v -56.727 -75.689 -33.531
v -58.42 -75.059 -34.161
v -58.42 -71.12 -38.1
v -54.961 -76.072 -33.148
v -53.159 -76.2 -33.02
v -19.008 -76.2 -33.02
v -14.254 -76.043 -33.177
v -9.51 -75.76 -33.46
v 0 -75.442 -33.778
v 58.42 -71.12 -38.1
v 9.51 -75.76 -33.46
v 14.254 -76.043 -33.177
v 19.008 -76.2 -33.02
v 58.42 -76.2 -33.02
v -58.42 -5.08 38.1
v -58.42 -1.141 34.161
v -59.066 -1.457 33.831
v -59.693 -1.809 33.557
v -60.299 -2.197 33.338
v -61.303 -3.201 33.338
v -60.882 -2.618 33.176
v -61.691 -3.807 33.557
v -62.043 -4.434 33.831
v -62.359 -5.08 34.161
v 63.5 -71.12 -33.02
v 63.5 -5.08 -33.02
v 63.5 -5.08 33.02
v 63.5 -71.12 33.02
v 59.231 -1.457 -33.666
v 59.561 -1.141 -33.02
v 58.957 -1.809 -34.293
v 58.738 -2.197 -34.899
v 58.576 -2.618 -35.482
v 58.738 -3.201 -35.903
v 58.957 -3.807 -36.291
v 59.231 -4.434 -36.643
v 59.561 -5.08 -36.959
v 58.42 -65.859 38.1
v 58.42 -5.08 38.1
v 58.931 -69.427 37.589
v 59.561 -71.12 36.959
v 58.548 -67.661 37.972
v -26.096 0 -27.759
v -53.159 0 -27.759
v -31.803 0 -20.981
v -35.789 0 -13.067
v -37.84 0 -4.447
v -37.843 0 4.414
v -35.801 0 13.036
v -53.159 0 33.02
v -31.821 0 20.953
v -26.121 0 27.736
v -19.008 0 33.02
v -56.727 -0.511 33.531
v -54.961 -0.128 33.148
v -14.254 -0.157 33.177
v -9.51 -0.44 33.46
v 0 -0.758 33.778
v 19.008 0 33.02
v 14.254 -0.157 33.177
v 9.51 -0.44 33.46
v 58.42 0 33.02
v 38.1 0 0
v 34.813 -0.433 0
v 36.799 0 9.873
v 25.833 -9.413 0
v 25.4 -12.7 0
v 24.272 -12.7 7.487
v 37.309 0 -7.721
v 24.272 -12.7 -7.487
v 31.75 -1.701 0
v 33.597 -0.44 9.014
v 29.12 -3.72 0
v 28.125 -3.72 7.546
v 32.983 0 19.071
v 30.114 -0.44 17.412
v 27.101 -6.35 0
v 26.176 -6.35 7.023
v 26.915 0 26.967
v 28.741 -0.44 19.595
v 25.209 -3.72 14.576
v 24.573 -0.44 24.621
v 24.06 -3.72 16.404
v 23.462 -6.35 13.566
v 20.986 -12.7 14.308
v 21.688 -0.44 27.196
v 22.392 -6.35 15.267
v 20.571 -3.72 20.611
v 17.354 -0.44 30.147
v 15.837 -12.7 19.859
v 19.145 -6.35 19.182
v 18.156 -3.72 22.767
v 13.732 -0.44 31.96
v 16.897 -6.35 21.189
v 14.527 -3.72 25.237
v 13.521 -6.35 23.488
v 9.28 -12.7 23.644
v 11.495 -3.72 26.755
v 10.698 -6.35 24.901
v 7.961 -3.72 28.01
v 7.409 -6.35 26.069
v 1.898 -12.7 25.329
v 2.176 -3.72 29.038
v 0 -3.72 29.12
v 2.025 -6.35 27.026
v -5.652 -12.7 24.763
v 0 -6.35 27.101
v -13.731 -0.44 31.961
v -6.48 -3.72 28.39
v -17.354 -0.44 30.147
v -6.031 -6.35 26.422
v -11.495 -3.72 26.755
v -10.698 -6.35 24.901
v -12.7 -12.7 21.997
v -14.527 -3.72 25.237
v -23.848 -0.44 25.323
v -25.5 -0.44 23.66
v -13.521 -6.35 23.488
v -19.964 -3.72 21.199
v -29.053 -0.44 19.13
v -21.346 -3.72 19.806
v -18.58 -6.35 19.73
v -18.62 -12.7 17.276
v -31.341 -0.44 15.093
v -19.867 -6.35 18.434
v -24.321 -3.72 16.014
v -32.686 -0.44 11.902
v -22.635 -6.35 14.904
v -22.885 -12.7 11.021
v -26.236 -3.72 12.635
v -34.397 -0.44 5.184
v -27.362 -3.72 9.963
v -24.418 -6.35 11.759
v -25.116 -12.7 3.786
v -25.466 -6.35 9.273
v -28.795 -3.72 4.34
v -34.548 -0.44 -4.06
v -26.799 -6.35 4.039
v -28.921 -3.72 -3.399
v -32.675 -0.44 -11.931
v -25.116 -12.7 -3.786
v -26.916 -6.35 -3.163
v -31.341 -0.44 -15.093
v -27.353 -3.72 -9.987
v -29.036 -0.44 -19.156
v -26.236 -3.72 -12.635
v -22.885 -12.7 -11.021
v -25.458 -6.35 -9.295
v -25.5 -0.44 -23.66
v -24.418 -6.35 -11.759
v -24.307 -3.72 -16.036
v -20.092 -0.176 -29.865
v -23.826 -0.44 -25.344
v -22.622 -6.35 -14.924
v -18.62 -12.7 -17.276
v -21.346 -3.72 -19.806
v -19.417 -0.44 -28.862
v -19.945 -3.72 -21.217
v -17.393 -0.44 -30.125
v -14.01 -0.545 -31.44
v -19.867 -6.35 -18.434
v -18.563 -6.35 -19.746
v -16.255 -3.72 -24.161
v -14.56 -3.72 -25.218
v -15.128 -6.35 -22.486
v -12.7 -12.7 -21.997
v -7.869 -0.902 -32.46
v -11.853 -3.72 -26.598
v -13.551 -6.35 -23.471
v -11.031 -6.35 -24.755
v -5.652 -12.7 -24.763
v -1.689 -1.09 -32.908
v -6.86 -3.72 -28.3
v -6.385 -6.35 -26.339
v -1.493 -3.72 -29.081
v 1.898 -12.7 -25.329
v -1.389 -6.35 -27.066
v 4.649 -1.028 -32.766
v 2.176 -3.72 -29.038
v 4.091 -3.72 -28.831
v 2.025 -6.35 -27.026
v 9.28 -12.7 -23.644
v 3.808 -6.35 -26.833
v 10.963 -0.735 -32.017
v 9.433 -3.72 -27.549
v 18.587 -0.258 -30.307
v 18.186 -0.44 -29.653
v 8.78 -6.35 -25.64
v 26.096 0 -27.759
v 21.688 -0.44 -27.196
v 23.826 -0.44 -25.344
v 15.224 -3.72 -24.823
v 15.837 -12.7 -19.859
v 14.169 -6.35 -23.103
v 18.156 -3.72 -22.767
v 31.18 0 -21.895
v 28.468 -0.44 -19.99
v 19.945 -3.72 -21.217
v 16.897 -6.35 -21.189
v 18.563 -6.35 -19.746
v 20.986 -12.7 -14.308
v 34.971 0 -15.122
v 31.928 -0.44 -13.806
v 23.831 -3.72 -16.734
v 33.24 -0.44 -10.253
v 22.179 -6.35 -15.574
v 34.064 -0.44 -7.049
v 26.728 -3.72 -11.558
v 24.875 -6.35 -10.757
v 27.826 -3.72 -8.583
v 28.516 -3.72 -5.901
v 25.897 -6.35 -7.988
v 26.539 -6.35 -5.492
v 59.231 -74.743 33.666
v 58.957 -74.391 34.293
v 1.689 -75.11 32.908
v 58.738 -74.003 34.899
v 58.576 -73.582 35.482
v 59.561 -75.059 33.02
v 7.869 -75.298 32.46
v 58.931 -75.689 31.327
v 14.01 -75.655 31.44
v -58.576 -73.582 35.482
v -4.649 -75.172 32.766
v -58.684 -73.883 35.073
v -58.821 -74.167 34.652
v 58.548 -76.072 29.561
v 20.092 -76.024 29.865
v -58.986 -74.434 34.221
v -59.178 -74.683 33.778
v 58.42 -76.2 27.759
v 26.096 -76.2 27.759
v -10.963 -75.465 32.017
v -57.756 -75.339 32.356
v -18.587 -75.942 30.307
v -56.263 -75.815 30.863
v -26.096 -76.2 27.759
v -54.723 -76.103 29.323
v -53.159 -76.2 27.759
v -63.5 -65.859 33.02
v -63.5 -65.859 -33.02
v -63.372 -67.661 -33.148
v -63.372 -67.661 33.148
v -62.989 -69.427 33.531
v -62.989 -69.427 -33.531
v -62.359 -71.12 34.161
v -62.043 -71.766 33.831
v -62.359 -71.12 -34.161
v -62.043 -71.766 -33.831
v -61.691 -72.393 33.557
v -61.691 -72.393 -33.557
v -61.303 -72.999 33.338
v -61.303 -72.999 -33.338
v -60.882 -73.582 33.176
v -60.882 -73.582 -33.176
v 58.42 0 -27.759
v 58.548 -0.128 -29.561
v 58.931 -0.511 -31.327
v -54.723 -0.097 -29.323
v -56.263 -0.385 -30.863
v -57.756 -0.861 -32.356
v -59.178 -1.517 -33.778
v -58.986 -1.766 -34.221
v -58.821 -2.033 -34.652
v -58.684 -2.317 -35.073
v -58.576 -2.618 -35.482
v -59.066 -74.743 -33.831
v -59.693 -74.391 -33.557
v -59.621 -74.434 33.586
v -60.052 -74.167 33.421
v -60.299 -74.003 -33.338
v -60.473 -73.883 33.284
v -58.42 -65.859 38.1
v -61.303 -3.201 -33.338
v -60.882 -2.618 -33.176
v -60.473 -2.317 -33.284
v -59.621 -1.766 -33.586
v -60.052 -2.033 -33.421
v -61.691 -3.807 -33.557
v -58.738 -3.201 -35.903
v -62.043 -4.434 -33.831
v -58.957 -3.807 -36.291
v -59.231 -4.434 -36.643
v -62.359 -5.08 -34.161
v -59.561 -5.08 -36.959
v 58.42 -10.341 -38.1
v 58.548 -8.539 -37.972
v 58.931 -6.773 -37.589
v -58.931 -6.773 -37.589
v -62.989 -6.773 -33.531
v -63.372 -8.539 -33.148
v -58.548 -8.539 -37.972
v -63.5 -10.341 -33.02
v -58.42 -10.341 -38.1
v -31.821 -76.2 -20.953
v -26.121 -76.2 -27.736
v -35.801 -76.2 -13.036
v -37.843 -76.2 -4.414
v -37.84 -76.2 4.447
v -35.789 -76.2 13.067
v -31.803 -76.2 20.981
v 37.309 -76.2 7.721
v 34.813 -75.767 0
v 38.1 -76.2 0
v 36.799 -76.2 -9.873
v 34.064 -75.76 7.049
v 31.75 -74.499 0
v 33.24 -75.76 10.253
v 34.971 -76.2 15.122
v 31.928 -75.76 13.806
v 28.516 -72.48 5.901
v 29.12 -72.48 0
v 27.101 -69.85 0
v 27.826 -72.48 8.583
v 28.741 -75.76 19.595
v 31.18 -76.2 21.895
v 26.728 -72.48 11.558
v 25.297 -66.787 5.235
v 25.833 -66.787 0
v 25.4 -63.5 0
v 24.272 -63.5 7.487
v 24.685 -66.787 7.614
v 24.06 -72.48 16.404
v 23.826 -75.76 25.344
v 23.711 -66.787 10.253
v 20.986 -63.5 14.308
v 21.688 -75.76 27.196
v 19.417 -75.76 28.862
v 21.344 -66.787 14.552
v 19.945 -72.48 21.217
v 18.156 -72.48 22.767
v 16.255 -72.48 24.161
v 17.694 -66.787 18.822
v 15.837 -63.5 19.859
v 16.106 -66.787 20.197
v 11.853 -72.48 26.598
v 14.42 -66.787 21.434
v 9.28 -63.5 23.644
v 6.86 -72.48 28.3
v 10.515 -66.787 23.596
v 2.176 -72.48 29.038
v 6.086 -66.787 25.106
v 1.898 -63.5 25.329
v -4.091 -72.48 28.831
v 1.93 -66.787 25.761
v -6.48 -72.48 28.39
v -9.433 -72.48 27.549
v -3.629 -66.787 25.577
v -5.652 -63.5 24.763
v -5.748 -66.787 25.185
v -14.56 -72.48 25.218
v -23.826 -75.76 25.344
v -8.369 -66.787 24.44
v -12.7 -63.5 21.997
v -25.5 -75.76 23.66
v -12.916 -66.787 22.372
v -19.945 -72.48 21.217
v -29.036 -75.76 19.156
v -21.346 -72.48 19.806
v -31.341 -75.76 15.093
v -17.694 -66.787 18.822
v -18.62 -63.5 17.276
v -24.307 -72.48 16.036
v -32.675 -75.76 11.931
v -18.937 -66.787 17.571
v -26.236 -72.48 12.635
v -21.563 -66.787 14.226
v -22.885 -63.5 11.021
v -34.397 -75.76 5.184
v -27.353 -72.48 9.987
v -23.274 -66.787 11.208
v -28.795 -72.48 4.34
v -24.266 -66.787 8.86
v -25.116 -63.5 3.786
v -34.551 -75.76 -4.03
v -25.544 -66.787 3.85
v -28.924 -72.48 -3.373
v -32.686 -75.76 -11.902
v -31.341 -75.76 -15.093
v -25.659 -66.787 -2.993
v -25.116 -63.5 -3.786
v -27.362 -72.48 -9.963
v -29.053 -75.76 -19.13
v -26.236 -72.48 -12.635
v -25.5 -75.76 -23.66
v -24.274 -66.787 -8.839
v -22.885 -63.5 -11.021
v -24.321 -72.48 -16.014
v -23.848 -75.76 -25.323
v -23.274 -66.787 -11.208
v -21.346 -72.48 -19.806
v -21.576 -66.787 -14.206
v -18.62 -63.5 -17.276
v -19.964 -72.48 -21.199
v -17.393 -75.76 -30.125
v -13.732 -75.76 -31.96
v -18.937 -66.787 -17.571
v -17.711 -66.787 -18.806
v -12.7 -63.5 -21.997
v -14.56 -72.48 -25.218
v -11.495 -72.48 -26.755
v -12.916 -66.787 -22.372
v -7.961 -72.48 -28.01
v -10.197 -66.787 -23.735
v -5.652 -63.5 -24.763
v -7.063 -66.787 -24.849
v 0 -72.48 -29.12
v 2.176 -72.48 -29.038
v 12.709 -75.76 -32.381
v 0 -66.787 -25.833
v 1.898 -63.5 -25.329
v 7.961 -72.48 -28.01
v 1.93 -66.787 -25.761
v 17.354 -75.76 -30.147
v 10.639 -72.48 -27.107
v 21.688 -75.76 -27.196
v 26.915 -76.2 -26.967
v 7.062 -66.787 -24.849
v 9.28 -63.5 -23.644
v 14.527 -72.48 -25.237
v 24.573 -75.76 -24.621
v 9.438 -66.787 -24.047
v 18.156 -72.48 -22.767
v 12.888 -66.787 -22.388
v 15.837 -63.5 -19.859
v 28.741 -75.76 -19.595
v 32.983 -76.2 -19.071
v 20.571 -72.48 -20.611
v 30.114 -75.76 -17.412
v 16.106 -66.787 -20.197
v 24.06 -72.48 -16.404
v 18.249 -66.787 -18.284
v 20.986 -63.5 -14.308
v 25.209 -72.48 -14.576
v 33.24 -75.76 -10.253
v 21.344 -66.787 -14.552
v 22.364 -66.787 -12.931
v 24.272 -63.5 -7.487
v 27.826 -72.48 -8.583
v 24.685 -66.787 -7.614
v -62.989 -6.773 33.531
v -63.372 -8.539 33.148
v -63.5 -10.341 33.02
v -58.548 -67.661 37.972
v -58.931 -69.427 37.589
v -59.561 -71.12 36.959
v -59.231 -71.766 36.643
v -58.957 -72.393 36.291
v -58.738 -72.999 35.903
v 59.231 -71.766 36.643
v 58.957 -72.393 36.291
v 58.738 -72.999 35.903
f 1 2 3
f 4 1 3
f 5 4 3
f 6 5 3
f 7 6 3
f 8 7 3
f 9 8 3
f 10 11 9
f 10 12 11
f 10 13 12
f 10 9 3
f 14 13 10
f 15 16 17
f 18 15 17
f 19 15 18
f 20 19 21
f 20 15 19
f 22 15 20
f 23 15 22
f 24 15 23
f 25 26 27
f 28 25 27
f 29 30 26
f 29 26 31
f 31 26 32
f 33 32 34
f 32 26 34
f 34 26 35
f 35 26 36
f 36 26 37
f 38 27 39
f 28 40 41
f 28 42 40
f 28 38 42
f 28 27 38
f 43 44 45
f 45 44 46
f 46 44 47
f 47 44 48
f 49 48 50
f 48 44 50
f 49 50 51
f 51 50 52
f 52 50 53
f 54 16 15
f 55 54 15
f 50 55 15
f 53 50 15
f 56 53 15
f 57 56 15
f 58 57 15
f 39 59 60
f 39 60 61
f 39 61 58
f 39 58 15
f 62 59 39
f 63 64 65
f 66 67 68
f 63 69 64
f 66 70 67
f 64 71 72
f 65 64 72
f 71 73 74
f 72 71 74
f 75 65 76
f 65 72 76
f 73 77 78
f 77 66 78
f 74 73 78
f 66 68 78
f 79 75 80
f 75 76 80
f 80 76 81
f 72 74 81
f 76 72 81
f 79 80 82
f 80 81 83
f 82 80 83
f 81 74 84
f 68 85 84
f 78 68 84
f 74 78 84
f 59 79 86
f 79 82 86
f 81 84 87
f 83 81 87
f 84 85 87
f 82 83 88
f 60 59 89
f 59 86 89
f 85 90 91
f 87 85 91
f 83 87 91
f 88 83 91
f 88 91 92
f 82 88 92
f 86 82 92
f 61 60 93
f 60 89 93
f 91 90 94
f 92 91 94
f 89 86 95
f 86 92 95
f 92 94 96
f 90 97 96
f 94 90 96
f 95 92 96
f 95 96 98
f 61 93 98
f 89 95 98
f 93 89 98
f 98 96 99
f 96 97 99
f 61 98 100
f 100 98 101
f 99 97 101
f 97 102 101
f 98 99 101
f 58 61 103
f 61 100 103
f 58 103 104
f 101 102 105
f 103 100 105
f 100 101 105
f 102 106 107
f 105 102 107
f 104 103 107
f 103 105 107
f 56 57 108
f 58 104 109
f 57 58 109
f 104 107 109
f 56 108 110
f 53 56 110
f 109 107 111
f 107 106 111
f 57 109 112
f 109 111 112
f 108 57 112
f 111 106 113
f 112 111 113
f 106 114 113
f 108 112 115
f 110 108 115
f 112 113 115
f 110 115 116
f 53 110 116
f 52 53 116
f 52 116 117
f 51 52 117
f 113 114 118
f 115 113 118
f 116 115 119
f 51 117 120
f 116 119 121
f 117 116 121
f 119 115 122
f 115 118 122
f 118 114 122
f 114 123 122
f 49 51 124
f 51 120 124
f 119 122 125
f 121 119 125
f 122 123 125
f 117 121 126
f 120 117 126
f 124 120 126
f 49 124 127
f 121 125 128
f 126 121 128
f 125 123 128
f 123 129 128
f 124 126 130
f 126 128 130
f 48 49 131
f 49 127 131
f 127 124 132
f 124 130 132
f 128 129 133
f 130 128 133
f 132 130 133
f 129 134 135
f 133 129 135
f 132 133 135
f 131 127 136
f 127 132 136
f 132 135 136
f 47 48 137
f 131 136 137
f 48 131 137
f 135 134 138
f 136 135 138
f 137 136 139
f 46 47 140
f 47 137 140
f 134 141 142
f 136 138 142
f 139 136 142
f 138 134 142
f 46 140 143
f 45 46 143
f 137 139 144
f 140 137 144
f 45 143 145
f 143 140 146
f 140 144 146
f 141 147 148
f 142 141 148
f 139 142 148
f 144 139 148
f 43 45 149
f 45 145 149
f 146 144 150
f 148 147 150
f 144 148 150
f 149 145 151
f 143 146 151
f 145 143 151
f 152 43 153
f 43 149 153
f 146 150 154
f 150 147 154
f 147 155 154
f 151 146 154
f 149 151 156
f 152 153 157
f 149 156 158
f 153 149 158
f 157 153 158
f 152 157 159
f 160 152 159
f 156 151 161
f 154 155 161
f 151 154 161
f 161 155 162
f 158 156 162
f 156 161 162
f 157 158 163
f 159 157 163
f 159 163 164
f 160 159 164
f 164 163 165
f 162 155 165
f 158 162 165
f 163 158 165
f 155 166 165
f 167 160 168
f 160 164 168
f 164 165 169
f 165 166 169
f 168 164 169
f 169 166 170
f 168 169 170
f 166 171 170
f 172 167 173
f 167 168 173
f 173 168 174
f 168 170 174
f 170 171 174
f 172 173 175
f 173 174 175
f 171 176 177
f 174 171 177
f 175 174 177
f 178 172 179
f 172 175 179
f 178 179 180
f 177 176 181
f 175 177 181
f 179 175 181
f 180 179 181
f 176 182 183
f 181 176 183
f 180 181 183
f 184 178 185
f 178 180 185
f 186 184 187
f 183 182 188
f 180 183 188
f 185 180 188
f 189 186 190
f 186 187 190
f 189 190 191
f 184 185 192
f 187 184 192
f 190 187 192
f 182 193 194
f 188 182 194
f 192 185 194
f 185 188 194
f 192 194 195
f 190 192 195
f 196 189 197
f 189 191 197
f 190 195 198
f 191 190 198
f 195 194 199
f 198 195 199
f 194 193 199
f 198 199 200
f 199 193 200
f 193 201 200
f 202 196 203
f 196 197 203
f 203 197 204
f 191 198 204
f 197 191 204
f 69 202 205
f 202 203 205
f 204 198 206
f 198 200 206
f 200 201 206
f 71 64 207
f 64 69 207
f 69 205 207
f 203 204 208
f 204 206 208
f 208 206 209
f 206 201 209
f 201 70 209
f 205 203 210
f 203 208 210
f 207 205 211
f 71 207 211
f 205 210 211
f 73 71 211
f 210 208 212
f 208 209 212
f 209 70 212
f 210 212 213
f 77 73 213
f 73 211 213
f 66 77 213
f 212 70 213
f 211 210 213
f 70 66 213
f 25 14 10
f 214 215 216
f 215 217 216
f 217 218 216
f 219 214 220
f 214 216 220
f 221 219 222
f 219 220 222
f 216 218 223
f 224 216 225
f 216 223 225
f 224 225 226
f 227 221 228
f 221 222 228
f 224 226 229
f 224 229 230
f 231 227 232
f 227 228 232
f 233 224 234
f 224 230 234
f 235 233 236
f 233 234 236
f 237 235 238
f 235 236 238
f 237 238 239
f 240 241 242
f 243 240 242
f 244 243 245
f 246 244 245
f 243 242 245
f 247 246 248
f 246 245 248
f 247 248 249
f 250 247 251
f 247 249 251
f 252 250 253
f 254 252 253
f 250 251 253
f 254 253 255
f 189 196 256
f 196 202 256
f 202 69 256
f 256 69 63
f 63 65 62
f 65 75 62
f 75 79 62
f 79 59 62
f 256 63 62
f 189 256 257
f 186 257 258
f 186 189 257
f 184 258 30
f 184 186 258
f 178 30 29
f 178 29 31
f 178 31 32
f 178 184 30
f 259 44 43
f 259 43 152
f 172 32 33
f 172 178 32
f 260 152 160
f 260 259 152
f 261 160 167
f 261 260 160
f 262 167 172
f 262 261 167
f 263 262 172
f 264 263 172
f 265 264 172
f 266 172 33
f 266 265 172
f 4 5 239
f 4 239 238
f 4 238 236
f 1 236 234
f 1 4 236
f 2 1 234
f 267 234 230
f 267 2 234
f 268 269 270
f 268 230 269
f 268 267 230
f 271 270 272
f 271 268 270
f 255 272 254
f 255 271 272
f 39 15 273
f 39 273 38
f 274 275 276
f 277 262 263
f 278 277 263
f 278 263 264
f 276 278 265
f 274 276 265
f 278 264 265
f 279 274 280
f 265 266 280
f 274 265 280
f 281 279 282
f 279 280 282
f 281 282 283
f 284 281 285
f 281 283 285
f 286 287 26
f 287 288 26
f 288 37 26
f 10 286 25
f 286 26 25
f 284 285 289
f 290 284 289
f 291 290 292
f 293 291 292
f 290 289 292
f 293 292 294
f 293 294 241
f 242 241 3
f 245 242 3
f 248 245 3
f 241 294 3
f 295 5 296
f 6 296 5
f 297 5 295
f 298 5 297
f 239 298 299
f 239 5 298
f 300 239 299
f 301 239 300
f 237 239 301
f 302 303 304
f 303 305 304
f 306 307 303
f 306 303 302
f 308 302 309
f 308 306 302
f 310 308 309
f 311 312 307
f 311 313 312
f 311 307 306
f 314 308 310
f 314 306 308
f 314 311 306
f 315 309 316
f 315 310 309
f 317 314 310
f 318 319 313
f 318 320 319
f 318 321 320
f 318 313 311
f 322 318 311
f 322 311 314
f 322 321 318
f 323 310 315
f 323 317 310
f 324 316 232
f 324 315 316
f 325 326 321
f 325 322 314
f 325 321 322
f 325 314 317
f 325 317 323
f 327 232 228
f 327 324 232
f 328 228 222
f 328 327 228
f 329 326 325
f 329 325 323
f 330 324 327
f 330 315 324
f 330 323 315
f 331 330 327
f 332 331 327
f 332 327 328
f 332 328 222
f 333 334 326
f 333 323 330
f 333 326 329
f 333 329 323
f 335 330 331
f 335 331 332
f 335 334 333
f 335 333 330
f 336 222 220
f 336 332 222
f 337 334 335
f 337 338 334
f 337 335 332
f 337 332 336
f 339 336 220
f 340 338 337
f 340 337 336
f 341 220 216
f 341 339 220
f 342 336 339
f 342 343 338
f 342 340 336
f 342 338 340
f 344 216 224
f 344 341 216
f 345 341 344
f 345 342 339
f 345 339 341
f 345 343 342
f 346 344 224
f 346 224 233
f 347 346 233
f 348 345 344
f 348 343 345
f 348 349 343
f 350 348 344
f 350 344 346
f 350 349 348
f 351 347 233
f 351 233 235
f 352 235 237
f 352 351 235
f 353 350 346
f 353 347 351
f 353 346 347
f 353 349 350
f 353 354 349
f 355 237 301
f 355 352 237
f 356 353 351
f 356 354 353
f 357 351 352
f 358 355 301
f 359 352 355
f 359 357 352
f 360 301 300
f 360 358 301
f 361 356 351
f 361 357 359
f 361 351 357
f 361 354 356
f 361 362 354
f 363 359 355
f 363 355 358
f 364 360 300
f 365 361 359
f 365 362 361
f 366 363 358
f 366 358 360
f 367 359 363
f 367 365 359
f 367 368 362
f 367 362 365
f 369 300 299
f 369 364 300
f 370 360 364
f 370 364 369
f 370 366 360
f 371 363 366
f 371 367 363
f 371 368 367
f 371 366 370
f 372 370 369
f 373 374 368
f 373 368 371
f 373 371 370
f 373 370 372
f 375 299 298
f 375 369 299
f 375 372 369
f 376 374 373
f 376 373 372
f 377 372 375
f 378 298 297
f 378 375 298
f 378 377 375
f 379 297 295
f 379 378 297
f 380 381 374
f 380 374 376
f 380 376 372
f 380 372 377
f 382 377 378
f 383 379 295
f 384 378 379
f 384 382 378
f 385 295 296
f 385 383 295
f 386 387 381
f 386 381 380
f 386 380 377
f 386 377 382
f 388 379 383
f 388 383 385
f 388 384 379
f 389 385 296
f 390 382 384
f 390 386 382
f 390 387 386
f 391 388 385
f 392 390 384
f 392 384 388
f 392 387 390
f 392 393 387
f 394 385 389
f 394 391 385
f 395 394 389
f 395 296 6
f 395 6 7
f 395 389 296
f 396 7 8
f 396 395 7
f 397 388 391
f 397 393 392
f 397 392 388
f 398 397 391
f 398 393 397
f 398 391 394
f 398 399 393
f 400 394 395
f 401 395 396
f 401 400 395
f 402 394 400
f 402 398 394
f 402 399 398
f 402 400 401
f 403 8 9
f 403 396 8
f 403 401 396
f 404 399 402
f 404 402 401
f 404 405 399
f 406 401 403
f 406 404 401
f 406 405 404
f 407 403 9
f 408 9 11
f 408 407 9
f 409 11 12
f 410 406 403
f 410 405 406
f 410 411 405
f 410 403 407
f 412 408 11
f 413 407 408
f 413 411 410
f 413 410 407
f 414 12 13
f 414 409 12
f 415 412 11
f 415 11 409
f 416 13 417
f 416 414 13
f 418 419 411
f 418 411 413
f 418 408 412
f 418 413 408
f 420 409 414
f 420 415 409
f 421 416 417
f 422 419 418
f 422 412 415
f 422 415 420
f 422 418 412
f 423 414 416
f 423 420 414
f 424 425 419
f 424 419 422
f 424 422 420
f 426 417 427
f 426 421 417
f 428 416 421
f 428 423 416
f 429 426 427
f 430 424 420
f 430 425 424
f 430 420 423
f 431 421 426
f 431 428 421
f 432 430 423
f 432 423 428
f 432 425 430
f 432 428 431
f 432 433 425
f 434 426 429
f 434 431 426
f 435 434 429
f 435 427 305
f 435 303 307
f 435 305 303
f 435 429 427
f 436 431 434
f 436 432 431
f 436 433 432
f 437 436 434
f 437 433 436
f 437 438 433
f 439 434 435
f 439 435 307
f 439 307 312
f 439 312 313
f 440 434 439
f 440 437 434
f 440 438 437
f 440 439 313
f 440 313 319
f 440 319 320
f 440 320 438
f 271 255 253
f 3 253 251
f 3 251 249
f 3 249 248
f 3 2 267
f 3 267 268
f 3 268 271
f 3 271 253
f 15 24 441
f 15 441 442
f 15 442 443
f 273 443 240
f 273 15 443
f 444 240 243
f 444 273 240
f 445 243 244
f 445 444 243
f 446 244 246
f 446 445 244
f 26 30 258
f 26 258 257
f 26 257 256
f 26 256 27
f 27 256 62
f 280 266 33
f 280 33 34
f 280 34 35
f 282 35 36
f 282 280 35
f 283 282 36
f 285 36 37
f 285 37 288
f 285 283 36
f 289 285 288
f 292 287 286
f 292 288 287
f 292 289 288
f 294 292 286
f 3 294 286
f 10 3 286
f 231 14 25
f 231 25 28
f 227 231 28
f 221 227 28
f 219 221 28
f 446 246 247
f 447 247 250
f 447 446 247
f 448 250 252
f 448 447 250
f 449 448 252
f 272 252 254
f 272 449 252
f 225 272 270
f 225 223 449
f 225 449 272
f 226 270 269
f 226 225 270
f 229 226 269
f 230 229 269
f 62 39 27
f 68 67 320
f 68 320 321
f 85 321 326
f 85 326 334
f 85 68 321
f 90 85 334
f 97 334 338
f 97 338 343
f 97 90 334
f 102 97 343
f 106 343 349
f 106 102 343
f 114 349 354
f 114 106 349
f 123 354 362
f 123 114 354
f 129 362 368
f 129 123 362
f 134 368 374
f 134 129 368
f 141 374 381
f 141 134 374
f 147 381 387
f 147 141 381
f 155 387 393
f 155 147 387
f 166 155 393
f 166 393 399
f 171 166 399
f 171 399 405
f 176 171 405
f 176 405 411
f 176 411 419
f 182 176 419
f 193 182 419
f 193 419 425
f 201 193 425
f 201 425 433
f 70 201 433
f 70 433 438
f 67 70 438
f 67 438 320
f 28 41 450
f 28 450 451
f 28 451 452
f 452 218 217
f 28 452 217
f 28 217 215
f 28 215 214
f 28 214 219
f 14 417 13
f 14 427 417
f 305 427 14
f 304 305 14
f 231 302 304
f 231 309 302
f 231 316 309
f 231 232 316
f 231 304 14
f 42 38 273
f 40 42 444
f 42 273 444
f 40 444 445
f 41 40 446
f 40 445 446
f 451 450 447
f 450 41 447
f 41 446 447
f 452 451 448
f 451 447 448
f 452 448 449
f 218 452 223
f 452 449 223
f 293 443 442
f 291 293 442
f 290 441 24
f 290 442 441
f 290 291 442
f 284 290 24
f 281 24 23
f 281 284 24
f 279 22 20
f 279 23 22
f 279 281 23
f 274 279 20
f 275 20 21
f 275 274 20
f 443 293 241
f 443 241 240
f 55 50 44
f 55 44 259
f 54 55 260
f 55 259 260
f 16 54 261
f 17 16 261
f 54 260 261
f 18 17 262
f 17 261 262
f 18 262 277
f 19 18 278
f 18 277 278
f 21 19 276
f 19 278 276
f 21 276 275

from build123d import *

# Parameters (mm, degrees)
F0_W        = 127
F0_H        = 76.2
F0_R        = 25.4
F1_DEPTH    = 76.2
F2_SIZE     = 5.08
F3_T1_DEPTH = 143.1425612107
F3_T3_DEPTH = 92.3425612107


# Not quite as in the source:
# - a fillet or chamfer that OpenCascade refuses, or shapes differently, is made with other operations: its cross-section is extruded or revolved along the edge and cut away or added


with BuildPart() as f1:
    # F0 (on Front) → F1 (new body)
    with BuildSketch(Plane.XZ):
        Rectangle(F0_W, F0_H)
        Circle(F0_R, mode=Mode.SUBTRACT)
    extrude(amount=F1_DEPTH)

    # F2
    f2_edges = [f1.edges().sort_by_distance(p)[0] for p in [
        (0, -76.2, 38.1),
        (-63.5, -38.1, 38.1),
        (0, 0, 38.1),
        (63.5, -38.1, 38.1),
        (63.5, -76.2, 0),
        (0, -76.2, -38.1),
        (-63.5, -76.2, 0),
        (63.5, -38.1, -38.1),
        (63.5, 0, 0),
        (0, 0, -38.1),
        (-63.5, 0, 0),
        (-63.5, -38.1, -38.1),
    ]]
    chamfer(f2_edges, length=F2_SIZE)

    # F3: fillet of radius 12.7 on 10 edges, made by hand

    # F3_s2 → F3_t1 (cut)
    with BuildSketch(Plane.YZ.offset(-71.5712806053)):
        with BuildLine():
            ThreePointArc((0, -27.7594877579), (-0.9667299371, -32.6195673489), (-3.7197438789, -36.7397438789))
            Line((-3.7197438789, -36.7397438789), (0, -33.02))
            Line((0, -33.02), (0, -27.7594877579))
        make_face()
        with BuildLine():
            ThreePointArc((-1.3602561211, -34.3802561211), (-5.4804326511, -37.1332700629), (-10.3405122421, -38.1))
            Line((-10.3405122421, -38.1), (-5.08, -38.1))
            Line((-5.08, -38.1), (-1.3602561211, -34.3802561211))
        make_face()
        with BuildLine():
            ThreePointArc((-65.8594877579, 38.1), (-70.7195673489, 37.1332700629), (-74.8397438789, 34.3802561211))
            Line((-74.8397438789, 34.3802561211), (-71.12, 38.1))
            Line((-71.12, 38.1), (-65.8594877579, 38.1))
        make_face()
        with BuildLine():
            ThreePointArc((-72.4802561211, 36.7397438789), (-75.2332700629, 32.6195673489), (-76.2, 27.7594877579))
            Line((-76.2, 27.7594877579), (-76.2, 33.02))
            Line((-76.2, 33.02), (-72.4802561211, 36.7397438789))
        make_face()
    extrude(amount=F3_T1_DEPTH, mode=Mode.SUBTRACT)

    # F3_s4 → F3_t3 (cut)
    with BuildSketch(Plane.XY.offset(-46.1712806053)):
        with BuildLine():
            ThreePointArc((-63.5, -65.8594877579), (-62.5332700629, -70.7195673489), (-59.7802561211, -74.8397438789))
            Line((-59.7802561211, -74.8397438789), (-63.5, -71.12))
            Line((-63.5, -71.12), (-63.5, -65.8594877579))
        make_face()
        with BuildLine():
            ThreePointArc((-53.1594877579, -76.2), (-58.0195673489, -75.2332700629), (-62.1397438789, -72.4802561211))
            Line((-62.1397438789, -72.4802561211), (-58.42, -76.2))
            Line((-58.42, -76.2), (-53.1594877579, -76.2))
        make_face()
        with BuildLine():
            ThreePointArc((-63.5, -10.3405122421), (-62.5332700629, -5.4804326511), (-59.7802561211, -1.3602561211))
            Line((-59.7802561211, -1.3602561211), (-63.5, -5.08))
            Line((-63.5, -5.08), (-63.5, -10.3405122421))
        make_face()
        with BuildLine():
            ThreePointArc((-53.1594877579, 0), (-58.0195673489, -0.9667299371), (-62.1397438789, -3.7197438789))
            Line((-62.1397438789, -3.7197438789), (-58.42, 0))
            Line((-58.42, 0), (-53.1594877579, 0))
        make_face()
    extrude(amount=F3_T3_DEPTH, mode=Mode.SUBTRACT)

    # F3_s5 → F3_t6 (revolve, cut)
    with BuildSketch(Plane.XY):
        with BuildLine():
            ThreePointArc((38.1, -76.2), (29.1197438789, -72.4802561211), (25.4, -63.5))
            Line((25.4, -63.5), (25.4, -76.2))
            Line((25.4, -76.2), (38.1, -76.2))
        make_face()
    revolve(axis=Axis((0, -76.2, 0), (0, -1, 0)), mode=Mode.SUBTRACT)

    # F3_s7 → F3_t8 (revolve, cut)
    with BuildSketch(Plane.XY):
        with BuildLine():
            ThreePointArc((38.1, 0), (29.1197438789, -3.7197438789), (25.4, -12.7))
            Line((25.4, -12.7), (25.4, 0))
            Line((25.4, 0), (38.1, 0))
        make_face()
    revolve(axis=Axis((0, 0, 0), (0, -1, 0)), mode=Mode.SUBTRACT)


solid = f1.part
